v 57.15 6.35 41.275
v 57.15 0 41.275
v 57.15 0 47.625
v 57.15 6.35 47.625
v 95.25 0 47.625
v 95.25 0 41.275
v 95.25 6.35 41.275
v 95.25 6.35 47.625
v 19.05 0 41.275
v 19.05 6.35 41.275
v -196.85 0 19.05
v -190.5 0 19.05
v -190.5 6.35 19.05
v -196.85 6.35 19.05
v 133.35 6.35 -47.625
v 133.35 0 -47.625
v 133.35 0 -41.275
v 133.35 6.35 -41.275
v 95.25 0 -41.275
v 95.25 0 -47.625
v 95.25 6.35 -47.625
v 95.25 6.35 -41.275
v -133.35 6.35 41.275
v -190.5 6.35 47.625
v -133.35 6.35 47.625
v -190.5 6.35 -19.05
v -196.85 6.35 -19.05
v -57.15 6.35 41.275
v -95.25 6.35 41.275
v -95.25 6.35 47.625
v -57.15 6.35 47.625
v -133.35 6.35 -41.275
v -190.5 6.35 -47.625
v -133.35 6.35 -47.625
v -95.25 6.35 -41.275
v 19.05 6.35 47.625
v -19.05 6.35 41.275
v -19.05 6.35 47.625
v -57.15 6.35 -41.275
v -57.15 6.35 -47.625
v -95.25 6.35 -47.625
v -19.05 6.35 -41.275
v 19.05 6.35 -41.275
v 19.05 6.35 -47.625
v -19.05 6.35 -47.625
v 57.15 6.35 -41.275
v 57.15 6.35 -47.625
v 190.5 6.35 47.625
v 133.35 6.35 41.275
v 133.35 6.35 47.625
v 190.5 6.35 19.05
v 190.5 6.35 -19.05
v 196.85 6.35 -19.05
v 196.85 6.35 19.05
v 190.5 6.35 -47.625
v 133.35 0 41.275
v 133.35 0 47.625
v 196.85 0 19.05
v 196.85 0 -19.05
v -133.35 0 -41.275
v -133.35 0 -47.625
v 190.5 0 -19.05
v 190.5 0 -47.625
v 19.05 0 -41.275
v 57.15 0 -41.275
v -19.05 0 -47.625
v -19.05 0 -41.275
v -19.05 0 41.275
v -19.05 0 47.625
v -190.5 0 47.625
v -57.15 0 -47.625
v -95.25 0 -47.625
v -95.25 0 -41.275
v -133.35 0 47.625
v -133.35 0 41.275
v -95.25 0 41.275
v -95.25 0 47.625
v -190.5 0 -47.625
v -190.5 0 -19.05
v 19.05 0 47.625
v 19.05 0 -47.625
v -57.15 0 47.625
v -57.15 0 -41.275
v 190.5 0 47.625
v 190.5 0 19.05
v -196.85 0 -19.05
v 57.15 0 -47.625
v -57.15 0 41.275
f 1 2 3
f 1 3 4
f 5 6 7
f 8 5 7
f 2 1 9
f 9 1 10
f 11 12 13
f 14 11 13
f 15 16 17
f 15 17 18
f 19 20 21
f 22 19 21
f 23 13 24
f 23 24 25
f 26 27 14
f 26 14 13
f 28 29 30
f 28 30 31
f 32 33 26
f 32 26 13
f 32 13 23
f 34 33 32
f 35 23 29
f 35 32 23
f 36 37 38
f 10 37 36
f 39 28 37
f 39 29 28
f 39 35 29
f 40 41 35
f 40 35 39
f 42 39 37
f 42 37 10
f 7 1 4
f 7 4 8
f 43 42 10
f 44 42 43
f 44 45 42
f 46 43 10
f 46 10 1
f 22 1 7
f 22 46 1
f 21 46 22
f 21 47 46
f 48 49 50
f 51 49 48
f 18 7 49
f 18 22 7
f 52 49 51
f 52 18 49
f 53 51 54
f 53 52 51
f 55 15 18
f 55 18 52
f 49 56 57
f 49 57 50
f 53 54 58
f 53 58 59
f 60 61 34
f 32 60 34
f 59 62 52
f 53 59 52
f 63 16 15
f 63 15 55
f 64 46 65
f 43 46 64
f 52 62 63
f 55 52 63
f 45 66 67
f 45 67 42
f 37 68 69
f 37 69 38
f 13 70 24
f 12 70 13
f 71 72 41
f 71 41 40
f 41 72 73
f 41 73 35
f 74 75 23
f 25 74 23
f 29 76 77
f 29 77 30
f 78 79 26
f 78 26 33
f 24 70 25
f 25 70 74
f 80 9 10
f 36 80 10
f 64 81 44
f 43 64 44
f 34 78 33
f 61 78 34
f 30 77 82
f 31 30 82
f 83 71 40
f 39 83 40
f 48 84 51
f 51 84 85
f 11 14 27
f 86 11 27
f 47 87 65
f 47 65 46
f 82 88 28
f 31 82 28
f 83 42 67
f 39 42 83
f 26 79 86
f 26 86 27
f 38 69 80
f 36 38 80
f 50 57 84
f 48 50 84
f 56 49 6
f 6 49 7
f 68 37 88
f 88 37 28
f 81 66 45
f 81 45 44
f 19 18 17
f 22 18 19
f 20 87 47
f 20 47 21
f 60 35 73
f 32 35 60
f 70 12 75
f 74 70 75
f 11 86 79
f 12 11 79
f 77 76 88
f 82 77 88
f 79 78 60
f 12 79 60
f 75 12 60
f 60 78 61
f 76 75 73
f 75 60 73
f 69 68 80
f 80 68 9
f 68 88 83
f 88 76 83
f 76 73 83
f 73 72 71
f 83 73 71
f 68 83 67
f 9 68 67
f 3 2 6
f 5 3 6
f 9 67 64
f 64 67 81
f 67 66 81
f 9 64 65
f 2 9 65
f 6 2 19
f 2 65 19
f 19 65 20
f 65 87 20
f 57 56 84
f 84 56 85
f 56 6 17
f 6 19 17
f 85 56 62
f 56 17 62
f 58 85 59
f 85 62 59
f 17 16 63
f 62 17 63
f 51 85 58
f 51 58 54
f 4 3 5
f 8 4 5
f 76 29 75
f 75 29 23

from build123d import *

# Parameters (mm, degrees)
ESQUISSE2_W                     = 381
ESQUISSE2_H                     = 95.25
BOSS_EXTRU_1_DEPTH              = 6.35
ESQUISSE3_W                     = 38.1
ESQUISSE3_H                     = 6.35
BOSS_EXTRU_2_DEPTH              = 6.35
ESQUISSE4_W                     = 38.1
ESQUISSE4_H                     = 6.35
ENL_V_MAT_EXTRU_1_DEPTH         = 6.35
R_P_TITION_LIN_AIRE1_COUNT      = 4
R_P_TITION_LIN_AIRE1_PITCH      = 76.2
R_P_TITION_LIN_AIRE1_COUNT_DIR2 = 2
R_P_TITION_LIN_AIRE1_PITCH_DIR2 = 88.9


with BuildPart() as part:
    # Esquisse2 → Boss.-Extru.1 (new body)
    with BuildSketch(Plane(origin=(0, 0, 0), x_dir=(1, 0, 0), z_dir=(0, 1, 0))):
        Rectangle(ESQUISSE2_W, ESQUISSE2_H)
    extrude(amount=BOSS_EXTRU_1_DEPTH)

    # Esquisse3 → Boss.-Extru.2 (add)
    with BuildSketch(Plane(origin=(190.5, 0, 0), x_dir=(0, 0, -1), z_dir=(1, 0, 0))):
        with Locations((0, 3.175)):
            Rectangle(ESQUISSE3_W, ESQUISSE3_H)
    boss_extru_2 = extrude(amount=BOSS_EXTRU_2_DEPTH)

    # Esquisse4 → Enlèv. mat.-Extru.1 (cut)
    with BuildSketch(Plane(origin=(0, 0, -47.625), x_dir=(-1, 0, 0), z_dir=(0, 0, -1))):
        with Locations((-114.3, 3.175)):
            Rectangle(ESQUISSE4_W, ESQUISSE4_H)
    enl_v_mat_extru_1 = extrude(amount=-ENL_V_MAT_EXTRU_1_DEPTH, mode=Mode.SUBTRACT)

    # Répétition linéaire1: Enl_v. mat.-Extru.1 4 × 2
    with Locations(*[(-i * R_P_TITION_LIN_AIRE1_PITCH, 0, j * R_P_TITION_LIN_AIRE1_PITCH_DIR2) for i in range(R_P_TITION_LIN_AIRE1_COUNT) for j in range(R_P_TITION_LIN_AIRE1_COUNT_DIR2) if (i, j) != (0, 0)]):
        add(enl_v_mat_extru_1, mode=Mode.SUBTRACT)

    # Symétrie1: Boss.-Extru.2 across plane
    add(boss_extru_2.mirror(Plane(origin=(0, 0, 0), x_dir=(0, 0, 1), z_dir=(1, 0, 0))))


solid = part.part
